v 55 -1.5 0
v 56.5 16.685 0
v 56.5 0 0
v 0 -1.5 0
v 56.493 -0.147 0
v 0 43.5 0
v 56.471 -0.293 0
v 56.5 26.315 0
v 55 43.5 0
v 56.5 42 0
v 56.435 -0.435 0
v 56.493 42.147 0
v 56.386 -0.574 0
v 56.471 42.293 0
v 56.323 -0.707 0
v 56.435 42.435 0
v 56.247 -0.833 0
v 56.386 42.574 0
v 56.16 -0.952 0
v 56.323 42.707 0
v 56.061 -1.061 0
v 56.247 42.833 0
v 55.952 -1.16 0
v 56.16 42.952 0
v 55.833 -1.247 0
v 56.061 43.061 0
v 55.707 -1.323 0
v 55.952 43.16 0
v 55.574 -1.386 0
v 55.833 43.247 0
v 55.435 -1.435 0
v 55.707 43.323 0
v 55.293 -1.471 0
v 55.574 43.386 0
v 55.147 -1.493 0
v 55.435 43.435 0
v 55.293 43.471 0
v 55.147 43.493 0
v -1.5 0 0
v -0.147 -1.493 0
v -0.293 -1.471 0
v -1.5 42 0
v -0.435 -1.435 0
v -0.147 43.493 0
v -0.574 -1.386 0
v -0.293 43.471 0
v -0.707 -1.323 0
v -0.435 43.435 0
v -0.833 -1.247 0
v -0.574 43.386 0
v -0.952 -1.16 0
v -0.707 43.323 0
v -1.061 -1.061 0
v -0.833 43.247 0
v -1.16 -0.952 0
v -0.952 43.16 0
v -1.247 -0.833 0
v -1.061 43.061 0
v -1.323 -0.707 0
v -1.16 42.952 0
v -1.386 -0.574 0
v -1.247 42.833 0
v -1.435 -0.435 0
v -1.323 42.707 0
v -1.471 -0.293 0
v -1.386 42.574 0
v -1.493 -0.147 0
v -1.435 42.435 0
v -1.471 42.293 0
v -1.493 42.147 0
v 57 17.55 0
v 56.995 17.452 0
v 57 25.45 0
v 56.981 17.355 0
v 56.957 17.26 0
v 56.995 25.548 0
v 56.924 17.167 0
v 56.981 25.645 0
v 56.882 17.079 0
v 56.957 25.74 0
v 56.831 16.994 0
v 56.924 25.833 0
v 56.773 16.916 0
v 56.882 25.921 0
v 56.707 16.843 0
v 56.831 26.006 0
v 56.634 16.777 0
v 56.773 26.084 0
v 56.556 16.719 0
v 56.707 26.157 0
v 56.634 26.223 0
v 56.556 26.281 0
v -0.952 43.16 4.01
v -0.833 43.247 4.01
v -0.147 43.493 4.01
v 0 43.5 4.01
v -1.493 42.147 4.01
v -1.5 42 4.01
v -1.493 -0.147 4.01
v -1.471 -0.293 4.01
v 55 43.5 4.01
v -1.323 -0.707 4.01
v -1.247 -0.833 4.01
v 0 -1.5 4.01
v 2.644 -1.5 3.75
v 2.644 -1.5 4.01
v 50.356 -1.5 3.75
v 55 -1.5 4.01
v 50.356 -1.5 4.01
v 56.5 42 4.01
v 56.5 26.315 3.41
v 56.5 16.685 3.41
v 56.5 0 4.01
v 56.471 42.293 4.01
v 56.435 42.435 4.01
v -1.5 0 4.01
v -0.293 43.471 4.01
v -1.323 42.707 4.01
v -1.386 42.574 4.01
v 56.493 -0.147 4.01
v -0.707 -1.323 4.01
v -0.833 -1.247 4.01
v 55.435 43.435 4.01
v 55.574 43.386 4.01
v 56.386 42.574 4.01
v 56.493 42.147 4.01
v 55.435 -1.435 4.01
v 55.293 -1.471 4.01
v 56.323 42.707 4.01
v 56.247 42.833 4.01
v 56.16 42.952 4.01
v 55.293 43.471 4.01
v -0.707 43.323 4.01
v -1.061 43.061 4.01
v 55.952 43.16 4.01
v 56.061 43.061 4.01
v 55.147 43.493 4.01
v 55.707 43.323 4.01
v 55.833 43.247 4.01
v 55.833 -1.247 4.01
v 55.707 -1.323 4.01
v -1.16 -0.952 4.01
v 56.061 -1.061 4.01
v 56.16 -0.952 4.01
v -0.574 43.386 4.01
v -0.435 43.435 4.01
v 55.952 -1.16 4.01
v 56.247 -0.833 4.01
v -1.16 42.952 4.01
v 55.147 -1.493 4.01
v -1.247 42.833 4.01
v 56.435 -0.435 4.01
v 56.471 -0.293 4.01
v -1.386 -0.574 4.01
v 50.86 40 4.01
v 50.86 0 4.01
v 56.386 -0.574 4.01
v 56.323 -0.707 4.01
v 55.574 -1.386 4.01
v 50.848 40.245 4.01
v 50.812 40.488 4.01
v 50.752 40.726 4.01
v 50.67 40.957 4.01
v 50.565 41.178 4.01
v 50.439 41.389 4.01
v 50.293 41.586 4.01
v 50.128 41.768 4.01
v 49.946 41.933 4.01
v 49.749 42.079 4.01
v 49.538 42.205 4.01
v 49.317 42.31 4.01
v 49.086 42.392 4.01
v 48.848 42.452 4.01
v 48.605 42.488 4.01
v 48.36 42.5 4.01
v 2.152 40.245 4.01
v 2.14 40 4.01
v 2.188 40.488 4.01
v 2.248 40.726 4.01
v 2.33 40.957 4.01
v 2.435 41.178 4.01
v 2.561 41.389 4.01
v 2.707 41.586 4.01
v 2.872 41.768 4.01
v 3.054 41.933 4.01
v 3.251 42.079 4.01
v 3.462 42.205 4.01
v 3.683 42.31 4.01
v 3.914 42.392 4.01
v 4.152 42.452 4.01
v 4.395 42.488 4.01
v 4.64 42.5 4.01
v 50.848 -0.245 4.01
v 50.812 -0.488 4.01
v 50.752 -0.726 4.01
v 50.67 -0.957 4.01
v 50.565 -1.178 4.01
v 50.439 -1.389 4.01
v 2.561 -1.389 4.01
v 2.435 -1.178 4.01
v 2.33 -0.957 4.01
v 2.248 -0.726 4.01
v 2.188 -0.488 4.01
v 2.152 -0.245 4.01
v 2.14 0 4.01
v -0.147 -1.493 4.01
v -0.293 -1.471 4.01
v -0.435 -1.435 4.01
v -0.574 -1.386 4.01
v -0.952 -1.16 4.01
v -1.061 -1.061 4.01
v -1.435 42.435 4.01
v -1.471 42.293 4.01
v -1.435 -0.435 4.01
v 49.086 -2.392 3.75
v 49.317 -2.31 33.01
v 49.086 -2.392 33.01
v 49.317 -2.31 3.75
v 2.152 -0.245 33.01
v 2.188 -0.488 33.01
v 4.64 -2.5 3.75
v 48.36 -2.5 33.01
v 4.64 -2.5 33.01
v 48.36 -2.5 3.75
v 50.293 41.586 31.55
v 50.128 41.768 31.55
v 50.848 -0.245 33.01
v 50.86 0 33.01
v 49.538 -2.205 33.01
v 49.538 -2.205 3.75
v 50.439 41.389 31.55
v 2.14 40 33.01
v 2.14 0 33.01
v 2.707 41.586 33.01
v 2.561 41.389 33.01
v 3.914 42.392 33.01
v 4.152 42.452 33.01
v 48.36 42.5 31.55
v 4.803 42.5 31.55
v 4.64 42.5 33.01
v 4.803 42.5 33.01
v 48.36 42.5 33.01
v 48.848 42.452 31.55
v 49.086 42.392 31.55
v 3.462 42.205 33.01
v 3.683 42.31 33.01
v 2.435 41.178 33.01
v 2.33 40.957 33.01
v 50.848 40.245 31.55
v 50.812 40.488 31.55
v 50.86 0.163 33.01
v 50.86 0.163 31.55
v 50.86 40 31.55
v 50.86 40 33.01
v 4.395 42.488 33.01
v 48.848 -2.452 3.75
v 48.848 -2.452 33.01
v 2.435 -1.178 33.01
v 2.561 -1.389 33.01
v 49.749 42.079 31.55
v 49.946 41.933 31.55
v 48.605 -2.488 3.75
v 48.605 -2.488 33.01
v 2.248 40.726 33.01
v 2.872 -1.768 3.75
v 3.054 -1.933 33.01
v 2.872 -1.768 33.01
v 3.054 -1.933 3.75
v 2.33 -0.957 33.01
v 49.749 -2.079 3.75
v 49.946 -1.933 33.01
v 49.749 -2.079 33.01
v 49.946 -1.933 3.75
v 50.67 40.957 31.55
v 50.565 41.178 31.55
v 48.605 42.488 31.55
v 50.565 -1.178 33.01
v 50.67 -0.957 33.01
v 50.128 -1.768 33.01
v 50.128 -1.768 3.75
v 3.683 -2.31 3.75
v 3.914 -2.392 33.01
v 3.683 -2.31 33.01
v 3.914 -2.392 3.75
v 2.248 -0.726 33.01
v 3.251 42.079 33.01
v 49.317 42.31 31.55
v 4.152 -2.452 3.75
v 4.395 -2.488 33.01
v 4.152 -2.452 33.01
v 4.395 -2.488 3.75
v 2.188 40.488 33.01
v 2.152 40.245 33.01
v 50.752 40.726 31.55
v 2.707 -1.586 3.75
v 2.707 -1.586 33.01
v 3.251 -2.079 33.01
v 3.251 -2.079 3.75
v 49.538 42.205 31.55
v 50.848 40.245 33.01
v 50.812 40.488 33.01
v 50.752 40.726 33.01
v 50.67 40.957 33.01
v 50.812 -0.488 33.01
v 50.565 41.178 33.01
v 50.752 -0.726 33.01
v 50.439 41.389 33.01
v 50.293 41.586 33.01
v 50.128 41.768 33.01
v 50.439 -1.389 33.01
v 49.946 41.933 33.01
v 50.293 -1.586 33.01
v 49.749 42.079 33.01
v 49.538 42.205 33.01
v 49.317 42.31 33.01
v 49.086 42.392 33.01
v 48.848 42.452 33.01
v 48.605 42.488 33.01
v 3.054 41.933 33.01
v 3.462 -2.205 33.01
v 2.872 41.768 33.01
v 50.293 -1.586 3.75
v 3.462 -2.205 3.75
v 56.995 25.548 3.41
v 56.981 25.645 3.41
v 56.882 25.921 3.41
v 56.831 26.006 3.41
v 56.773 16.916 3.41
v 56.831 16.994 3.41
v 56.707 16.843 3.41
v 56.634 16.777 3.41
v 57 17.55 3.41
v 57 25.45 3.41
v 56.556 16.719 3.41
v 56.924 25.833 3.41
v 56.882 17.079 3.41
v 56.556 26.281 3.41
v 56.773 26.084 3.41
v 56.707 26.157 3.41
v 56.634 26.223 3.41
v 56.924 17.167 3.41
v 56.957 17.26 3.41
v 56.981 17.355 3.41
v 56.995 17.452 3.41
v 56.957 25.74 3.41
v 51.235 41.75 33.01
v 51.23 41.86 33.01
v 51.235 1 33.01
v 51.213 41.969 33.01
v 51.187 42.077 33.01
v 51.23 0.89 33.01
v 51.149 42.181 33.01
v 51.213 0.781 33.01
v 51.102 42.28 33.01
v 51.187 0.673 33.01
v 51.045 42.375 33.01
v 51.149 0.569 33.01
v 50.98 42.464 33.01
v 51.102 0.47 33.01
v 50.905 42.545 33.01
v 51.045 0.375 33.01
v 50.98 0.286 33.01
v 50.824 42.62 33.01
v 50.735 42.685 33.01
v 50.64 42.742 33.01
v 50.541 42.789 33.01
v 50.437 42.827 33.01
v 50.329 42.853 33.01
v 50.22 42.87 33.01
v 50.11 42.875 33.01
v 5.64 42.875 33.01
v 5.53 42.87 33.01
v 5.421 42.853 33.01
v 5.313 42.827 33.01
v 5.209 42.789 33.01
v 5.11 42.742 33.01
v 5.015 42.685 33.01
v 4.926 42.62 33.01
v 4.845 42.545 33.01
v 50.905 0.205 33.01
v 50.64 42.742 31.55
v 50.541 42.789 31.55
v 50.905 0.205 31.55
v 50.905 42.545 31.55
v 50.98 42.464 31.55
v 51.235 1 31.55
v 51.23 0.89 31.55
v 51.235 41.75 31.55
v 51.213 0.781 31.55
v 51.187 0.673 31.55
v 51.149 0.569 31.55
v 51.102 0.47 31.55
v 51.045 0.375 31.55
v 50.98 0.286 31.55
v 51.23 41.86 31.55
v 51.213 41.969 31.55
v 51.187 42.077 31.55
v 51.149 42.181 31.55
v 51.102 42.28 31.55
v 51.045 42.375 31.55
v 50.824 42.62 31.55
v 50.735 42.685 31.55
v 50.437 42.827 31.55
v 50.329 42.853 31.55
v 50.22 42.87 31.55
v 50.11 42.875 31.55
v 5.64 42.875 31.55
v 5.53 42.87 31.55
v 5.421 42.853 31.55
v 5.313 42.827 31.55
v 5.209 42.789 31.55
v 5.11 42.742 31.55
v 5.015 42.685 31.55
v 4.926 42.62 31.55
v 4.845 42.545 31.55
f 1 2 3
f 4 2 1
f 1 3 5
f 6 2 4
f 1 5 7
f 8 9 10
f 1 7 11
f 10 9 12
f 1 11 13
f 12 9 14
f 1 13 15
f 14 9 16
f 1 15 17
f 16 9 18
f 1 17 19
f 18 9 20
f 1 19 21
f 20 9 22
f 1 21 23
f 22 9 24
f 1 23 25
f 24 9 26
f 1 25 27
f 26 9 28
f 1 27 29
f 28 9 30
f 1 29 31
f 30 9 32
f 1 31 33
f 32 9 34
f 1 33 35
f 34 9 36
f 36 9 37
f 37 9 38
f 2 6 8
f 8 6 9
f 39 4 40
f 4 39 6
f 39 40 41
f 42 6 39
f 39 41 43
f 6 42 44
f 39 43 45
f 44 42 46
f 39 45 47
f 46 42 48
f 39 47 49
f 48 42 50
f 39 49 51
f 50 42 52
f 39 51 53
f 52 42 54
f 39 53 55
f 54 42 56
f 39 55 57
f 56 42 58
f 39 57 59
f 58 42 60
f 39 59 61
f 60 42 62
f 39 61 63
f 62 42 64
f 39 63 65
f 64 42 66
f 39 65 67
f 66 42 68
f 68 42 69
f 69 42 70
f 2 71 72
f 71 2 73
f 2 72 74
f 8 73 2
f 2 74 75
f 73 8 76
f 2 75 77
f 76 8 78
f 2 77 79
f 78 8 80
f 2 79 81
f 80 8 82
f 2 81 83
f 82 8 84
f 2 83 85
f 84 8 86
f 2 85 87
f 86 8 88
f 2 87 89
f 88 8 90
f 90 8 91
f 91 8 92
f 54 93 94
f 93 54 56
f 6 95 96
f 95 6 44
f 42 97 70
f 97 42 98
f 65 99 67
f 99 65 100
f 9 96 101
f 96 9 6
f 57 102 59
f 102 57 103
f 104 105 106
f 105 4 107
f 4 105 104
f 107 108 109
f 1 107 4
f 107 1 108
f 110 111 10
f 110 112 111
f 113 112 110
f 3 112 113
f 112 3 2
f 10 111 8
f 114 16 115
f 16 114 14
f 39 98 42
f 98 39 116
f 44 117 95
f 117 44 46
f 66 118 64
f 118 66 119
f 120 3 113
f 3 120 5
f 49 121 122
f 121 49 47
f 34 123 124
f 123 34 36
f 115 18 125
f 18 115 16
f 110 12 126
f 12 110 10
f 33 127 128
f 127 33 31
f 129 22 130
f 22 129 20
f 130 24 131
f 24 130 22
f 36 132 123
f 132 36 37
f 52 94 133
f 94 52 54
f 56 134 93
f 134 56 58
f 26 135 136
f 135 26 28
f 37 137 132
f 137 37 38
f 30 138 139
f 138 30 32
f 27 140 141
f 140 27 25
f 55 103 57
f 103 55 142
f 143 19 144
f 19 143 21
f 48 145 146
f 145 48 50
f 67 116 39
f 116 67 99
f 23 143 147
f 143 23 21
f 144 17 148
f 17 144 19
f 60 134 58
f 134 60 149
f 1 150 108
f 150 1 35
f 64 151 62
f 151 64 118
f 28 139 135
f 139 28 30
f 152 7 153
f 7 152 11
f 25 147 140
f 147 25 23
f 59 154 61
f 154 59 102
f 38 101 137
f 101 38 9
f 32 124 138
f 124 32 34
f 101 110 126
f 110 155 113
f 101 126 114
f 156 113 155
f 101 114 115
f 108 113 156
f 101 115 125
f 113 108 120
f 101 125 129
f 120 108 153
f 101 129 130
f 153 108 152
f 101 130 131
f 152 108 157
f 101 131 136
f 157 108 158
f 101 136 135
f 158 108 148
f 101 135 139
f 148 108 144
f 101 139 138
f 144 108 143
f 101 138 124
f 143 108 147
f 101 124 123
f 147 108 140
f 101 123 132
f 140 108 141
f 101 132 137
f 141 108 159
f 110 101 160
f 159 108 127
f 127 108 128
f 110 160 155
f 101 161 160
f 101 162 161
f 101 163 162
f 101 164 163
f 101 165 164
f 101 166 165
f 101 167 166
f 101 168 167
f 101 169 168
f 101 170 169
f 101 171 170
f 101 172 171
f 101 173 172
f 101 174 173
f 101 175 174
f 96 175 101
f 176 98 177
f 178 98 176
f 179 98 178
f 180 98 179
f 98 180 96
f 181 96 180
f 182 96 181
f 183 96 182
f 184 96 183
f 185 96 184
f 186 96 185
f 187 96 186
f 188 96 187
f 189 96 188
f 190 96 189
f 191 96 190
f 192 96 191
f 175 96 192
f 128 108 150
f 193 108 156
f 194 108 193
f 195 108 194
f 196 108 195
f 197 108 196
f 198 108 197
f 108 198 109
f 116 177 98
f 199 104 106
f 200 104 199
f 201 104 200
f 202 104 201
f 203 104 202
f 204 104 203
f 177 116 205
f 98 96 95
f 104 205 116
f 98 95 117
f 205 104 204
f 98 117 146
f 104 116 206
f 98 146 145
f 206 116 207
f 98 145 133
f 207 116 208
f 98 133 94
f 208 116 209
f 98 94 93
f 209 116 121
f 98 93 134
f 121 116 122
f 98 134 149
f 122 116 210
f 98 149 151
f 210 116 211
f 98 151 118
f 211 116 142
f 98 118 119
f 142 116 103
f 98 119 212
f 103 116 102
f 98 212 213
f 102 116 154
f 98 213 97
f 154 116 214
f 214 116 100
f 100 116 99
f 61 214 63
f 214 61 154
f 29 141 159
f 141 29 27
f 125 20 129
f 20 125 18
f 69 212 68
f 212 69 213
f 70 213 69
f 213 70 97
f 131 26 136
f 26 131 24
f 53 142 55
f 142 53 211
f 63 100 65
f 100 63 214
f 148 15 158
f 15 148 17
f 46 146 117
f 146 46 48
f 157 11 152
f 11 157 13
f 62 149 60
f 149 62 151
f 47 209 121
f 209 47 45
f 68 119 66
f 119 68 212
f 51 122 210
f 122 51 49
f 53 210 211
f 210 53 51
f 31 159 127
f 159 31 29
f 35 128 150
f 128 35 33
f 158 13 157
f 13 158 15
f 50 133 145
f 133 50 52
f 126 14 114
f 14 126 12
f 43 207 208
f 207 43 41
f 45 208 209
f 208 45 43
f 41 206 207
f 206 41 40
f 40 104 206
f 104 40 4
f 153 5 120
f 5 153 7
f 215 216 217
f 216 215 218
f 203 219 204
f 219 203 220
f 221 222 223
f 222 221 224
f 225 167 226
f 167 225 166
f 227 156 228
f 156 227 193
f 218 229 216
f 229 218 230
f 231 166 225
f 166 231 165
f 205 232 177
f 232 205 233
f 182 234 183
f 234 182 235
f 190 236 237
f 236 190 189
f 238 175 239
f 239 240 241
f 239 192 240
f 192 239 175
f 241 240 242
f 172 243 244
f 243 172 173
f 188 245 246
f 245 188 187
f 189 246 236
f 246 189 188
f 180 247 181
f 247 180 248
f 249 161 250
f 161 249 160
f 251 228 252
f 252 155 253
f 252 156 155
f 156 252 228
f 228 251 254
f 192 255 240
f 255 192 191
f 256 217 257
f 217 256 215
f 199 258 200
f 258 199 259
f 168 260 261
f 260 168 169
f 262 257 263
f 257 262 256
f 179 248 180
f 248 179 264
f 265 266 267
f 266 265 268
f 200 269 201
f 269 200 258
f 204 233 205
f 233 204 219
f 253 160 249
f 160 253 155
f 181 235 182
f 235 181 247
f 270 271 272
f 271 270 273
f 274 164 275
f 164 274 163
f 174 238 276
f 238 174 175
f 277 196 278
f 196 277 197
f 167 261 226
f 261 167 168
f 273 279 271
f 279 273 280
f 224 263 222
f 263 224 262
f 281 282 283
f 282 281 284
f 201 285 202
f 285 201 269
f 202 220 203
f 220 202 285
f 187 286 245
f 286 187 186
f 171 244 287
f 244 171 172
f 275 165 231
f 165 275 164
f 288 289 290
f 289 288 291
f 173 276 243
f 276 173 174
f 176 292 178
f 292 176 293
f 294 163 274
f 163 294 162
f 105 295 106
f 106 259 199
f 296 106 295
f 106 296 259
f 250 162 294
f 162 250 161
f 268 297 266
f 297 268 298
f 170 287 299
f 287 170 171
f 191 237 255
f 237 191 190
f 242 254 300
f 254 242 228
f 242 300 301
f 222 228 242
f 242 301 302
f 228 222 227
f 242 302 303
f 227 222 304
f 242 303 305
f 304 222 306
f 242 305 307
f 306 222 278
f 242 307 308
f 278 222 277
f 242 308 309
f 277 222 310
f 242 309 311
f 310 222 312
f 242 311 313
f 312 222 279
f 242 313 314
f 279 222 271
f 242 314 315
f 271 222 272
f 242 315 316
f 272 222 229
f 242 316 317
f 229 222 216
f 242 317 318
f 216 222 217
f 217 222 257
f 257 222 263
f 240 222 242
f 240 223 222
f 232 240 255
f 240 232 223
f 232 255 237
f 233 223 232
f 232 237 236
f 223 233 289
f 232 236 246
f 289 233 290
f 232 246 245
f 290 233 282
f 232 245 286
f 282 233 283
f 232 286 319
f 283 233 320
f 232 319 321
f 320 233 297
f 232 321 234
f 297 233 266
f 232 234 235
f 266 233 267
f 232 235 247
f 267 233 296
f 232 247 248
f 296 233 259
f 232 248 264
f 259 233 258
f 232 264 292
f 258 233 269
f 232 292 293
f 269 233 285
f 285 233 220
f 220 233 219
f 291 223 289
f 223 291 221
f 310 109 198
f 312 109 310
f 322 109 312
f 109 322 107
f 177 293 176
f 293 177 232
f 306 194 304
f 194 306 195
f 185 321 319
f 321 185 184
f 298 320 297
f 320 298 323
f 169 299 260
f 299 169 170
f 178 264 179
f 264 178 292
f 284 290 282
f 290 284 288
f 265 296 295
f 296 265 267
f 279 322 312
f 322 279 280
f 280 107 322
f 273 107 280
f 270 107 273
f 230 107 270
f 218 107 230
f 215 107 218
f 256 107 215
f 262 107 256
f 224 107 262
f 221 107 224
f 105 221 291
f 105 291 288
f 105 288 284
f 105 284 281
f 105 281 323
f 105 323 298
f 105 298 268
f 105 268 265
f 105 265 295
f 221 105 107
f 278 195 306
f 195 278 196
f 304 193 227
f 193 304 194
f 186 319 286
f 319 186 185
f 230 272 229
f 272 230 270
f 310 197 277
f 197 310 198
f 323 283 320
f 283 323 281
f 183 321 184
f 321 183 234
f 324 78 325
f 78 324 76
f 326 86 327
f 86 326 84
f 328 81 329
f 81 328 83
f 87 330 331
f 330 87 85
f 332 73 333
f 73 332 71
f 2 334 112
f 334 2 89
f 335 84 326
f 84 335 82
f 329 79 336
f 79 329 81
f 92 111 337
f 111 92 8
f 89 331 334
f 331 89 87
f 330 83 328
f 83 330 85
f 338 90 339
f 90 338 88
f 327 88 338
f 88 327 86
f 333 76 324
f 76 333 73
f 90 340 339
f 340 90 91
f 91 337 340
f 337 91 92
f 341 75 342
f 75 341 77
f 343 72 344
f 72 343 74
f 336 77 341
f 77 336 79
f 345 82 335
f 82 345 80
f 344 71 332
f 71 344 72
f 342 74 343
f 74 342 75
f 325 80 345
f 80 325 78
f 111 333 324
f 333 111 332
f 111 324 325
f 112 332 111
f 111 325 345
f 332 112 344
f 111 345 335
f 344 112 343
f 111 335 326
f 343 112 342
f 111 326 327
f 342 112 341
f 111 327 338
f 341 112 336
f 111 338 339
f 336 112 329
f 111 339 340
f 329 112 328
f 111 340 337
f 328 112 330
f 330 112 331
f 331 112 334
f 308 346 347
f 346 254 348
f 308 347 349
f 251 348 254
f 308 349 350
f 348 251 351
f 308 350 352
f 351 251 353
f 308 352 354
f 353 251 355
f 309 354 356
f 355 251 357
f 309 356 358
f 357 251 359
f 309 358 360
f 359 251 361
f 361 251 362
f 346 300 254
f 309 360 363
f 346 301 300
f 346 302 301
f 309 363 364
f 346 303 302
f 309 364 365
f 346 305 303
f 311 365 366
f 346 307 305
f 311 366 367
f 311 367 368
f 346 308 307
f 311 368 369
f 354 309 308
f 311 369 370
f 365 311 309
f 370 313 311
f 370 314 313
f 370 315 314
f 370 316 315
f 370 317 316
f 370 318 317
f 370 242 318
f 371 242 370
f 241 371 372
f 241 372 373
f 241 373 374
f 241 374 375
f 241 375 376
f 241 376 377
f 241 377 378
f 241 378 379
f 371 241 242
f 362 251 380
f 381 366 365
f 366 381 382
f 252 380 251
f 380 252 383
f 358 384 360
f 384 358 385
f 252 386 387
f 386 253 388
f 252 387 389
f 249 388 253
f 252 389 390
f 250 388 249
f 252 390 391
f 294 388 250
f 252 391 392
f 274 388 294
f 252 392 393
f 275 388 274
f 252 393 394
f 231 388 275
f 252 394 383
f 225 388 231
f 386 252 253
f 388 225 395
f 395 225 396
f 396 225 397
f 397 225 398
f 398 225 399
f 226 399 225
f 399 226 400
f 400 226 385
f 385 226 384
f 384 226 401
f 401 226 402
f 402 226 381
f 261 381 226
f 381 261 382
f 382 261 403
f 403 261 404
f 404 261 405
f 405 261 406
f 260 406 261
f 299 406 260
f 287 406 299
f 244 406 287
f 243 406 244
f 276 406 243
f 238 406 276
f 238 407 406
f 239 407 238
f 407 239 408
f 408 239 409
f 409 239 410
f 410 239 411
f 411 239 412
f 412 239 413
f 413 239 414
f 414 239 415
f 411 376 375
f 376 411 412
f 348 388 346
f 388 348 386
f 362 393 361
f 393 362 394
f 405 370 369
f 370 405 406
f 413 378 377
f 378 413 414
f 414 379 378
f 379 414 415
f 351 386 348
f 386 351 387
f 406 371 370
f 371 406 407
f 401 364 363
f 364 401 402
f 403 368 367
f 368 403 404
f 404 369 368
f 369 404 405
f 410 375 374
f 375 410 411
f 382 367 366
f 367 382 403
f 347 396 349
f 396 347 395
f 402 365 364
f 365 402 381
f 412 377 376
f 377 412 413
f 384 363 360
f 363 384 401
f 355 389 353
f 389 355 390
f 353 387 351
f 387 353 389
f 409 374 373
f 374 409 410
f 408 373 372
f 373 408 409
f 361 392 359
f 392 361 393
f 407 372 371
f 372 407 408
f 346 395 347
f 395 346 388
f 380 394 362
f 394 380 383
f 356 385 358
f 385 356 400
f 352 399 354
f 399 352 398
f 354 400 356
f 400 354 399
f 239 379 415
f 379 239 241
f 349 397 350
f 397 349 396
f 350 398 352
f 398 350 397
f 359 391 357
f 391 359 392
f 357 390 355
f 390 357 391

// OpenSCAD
$fn = 64;

// Solid State Relay module (single connected solid), overall: 58 x 45 x 33 mm
module ssr_module(len=58.0, wid=45.0, ht=33.0, corner_r=2.5) {

    eps = 0.25; // small overlap to guarantee connectivity

    // Base + body split (kept within overall height)
    base_th = 4.0;
    body_th = ht - base_th;

    // Side mounting ears (flanges) integrated into base, but kept within overall length
    ear_wid = wid * 0.22;
    ear_th  = base_th * 0.85;
    ear_ext = len * 0.08;                 // extension beyond body on each side
    body_len = len - 2*ear_ext;           // body length so ears bring total to len

    // Top terminal block (protrusion on top face), kept within overall envelope
    term_len = body_len * 0.78;
    term_wid = wid * 0.28;
    term_h   = ht * 0.18;

    // Underside ribs (heatsink-like), kept within overall envelope (do not extend below z=0)
    rib_count = 6;
    rib_h     = base_th * 0.55;
    rib_w     = wid * 0.06;
    rib_len   = body_len * 0.86;

    // Small top edge lip (subtle detail)
    lip_h = 1.2;
    lip_inset = 1.0;

    // Helper: rounded rectangle prism (rounded in XY, straight in Z)
    module rounded_prism_xy(L, W, H, R) {
        R2 = min(R, min(L, W)/2 - 0.01);
        minkowski() {
            cube([L - 2*R2, W - 2*R2, H], center=false);
            cylinder(h=0.01, r=R2, center=false);
        }
    }

    union() {

        // --- Base plate (metal) spans full overall length/width ---
        rounded_prism_xy(len, wid, base_th, max(0.8, corner_r*0.6));

        // --- Plastic body on top of base (shorter in length to allow ears within overall len) ---
        translate([ear_ext, 0, base_th - eps])
            rounded_prism_xy(body_len, wid, body_th + eps, corner_r);

        // --- Side mounting ears (connected to base), within overall length ---
        // Left ear occupies x=[0, ear_ext]
        translate([0, (wid - ear_wid)/2, 0])
            rounded_prism_xy(ear_ext + eps, ear_wid, ear_th, max(0.8, corner_r*0.4));

        // Right ear occupies x=[len-ear_ext, len]
        translate([len - ear_ext - eps, (wid - ear_wid)/2, 0])
            rounded_prism_xy(ear_ext + eps, ear_wid, ear_th, max(0.8, corner_r*0.4));

        // --- Top terminal block (connected), centered on body top ---
        translate([
            ear_ext + (body_len - term_len)/2,
            (wid - term_wid)/2,
            ht - term_h - eps
        ])
            rounded_prism_xy(term_len, term_wid, term_h + eps, max(1.0, corner_r*0.5));

        // --- Underside ribs (heatsink-like), connected to base underside but not below z=0 ---
        // Place ribs starting at z=0, overlapping into base by eps
        for (i = [0 : rib_count-1]) {
            translate([
                ear_ext + (body_len - rib_len)/2,
                (wid - rib_count*rib_w)/(rib_count+1) * (i+1) + rib_w*i,
                0
            ])
                cube([rib_len, rib_w, rib_h + eps], center=false);
        }

        // --- Small top edge lip (subtle detail), connected ---
        translate([ear_ext + lip_inset, lip_inset, ht - lip_h - eps])
            rounded_prism_xy(body_len - 2*lip_inset, wid - 2*lip_inset, lip_h + eps, max(1.0, corner_r*0.45));
    }
}

ssr_module();
